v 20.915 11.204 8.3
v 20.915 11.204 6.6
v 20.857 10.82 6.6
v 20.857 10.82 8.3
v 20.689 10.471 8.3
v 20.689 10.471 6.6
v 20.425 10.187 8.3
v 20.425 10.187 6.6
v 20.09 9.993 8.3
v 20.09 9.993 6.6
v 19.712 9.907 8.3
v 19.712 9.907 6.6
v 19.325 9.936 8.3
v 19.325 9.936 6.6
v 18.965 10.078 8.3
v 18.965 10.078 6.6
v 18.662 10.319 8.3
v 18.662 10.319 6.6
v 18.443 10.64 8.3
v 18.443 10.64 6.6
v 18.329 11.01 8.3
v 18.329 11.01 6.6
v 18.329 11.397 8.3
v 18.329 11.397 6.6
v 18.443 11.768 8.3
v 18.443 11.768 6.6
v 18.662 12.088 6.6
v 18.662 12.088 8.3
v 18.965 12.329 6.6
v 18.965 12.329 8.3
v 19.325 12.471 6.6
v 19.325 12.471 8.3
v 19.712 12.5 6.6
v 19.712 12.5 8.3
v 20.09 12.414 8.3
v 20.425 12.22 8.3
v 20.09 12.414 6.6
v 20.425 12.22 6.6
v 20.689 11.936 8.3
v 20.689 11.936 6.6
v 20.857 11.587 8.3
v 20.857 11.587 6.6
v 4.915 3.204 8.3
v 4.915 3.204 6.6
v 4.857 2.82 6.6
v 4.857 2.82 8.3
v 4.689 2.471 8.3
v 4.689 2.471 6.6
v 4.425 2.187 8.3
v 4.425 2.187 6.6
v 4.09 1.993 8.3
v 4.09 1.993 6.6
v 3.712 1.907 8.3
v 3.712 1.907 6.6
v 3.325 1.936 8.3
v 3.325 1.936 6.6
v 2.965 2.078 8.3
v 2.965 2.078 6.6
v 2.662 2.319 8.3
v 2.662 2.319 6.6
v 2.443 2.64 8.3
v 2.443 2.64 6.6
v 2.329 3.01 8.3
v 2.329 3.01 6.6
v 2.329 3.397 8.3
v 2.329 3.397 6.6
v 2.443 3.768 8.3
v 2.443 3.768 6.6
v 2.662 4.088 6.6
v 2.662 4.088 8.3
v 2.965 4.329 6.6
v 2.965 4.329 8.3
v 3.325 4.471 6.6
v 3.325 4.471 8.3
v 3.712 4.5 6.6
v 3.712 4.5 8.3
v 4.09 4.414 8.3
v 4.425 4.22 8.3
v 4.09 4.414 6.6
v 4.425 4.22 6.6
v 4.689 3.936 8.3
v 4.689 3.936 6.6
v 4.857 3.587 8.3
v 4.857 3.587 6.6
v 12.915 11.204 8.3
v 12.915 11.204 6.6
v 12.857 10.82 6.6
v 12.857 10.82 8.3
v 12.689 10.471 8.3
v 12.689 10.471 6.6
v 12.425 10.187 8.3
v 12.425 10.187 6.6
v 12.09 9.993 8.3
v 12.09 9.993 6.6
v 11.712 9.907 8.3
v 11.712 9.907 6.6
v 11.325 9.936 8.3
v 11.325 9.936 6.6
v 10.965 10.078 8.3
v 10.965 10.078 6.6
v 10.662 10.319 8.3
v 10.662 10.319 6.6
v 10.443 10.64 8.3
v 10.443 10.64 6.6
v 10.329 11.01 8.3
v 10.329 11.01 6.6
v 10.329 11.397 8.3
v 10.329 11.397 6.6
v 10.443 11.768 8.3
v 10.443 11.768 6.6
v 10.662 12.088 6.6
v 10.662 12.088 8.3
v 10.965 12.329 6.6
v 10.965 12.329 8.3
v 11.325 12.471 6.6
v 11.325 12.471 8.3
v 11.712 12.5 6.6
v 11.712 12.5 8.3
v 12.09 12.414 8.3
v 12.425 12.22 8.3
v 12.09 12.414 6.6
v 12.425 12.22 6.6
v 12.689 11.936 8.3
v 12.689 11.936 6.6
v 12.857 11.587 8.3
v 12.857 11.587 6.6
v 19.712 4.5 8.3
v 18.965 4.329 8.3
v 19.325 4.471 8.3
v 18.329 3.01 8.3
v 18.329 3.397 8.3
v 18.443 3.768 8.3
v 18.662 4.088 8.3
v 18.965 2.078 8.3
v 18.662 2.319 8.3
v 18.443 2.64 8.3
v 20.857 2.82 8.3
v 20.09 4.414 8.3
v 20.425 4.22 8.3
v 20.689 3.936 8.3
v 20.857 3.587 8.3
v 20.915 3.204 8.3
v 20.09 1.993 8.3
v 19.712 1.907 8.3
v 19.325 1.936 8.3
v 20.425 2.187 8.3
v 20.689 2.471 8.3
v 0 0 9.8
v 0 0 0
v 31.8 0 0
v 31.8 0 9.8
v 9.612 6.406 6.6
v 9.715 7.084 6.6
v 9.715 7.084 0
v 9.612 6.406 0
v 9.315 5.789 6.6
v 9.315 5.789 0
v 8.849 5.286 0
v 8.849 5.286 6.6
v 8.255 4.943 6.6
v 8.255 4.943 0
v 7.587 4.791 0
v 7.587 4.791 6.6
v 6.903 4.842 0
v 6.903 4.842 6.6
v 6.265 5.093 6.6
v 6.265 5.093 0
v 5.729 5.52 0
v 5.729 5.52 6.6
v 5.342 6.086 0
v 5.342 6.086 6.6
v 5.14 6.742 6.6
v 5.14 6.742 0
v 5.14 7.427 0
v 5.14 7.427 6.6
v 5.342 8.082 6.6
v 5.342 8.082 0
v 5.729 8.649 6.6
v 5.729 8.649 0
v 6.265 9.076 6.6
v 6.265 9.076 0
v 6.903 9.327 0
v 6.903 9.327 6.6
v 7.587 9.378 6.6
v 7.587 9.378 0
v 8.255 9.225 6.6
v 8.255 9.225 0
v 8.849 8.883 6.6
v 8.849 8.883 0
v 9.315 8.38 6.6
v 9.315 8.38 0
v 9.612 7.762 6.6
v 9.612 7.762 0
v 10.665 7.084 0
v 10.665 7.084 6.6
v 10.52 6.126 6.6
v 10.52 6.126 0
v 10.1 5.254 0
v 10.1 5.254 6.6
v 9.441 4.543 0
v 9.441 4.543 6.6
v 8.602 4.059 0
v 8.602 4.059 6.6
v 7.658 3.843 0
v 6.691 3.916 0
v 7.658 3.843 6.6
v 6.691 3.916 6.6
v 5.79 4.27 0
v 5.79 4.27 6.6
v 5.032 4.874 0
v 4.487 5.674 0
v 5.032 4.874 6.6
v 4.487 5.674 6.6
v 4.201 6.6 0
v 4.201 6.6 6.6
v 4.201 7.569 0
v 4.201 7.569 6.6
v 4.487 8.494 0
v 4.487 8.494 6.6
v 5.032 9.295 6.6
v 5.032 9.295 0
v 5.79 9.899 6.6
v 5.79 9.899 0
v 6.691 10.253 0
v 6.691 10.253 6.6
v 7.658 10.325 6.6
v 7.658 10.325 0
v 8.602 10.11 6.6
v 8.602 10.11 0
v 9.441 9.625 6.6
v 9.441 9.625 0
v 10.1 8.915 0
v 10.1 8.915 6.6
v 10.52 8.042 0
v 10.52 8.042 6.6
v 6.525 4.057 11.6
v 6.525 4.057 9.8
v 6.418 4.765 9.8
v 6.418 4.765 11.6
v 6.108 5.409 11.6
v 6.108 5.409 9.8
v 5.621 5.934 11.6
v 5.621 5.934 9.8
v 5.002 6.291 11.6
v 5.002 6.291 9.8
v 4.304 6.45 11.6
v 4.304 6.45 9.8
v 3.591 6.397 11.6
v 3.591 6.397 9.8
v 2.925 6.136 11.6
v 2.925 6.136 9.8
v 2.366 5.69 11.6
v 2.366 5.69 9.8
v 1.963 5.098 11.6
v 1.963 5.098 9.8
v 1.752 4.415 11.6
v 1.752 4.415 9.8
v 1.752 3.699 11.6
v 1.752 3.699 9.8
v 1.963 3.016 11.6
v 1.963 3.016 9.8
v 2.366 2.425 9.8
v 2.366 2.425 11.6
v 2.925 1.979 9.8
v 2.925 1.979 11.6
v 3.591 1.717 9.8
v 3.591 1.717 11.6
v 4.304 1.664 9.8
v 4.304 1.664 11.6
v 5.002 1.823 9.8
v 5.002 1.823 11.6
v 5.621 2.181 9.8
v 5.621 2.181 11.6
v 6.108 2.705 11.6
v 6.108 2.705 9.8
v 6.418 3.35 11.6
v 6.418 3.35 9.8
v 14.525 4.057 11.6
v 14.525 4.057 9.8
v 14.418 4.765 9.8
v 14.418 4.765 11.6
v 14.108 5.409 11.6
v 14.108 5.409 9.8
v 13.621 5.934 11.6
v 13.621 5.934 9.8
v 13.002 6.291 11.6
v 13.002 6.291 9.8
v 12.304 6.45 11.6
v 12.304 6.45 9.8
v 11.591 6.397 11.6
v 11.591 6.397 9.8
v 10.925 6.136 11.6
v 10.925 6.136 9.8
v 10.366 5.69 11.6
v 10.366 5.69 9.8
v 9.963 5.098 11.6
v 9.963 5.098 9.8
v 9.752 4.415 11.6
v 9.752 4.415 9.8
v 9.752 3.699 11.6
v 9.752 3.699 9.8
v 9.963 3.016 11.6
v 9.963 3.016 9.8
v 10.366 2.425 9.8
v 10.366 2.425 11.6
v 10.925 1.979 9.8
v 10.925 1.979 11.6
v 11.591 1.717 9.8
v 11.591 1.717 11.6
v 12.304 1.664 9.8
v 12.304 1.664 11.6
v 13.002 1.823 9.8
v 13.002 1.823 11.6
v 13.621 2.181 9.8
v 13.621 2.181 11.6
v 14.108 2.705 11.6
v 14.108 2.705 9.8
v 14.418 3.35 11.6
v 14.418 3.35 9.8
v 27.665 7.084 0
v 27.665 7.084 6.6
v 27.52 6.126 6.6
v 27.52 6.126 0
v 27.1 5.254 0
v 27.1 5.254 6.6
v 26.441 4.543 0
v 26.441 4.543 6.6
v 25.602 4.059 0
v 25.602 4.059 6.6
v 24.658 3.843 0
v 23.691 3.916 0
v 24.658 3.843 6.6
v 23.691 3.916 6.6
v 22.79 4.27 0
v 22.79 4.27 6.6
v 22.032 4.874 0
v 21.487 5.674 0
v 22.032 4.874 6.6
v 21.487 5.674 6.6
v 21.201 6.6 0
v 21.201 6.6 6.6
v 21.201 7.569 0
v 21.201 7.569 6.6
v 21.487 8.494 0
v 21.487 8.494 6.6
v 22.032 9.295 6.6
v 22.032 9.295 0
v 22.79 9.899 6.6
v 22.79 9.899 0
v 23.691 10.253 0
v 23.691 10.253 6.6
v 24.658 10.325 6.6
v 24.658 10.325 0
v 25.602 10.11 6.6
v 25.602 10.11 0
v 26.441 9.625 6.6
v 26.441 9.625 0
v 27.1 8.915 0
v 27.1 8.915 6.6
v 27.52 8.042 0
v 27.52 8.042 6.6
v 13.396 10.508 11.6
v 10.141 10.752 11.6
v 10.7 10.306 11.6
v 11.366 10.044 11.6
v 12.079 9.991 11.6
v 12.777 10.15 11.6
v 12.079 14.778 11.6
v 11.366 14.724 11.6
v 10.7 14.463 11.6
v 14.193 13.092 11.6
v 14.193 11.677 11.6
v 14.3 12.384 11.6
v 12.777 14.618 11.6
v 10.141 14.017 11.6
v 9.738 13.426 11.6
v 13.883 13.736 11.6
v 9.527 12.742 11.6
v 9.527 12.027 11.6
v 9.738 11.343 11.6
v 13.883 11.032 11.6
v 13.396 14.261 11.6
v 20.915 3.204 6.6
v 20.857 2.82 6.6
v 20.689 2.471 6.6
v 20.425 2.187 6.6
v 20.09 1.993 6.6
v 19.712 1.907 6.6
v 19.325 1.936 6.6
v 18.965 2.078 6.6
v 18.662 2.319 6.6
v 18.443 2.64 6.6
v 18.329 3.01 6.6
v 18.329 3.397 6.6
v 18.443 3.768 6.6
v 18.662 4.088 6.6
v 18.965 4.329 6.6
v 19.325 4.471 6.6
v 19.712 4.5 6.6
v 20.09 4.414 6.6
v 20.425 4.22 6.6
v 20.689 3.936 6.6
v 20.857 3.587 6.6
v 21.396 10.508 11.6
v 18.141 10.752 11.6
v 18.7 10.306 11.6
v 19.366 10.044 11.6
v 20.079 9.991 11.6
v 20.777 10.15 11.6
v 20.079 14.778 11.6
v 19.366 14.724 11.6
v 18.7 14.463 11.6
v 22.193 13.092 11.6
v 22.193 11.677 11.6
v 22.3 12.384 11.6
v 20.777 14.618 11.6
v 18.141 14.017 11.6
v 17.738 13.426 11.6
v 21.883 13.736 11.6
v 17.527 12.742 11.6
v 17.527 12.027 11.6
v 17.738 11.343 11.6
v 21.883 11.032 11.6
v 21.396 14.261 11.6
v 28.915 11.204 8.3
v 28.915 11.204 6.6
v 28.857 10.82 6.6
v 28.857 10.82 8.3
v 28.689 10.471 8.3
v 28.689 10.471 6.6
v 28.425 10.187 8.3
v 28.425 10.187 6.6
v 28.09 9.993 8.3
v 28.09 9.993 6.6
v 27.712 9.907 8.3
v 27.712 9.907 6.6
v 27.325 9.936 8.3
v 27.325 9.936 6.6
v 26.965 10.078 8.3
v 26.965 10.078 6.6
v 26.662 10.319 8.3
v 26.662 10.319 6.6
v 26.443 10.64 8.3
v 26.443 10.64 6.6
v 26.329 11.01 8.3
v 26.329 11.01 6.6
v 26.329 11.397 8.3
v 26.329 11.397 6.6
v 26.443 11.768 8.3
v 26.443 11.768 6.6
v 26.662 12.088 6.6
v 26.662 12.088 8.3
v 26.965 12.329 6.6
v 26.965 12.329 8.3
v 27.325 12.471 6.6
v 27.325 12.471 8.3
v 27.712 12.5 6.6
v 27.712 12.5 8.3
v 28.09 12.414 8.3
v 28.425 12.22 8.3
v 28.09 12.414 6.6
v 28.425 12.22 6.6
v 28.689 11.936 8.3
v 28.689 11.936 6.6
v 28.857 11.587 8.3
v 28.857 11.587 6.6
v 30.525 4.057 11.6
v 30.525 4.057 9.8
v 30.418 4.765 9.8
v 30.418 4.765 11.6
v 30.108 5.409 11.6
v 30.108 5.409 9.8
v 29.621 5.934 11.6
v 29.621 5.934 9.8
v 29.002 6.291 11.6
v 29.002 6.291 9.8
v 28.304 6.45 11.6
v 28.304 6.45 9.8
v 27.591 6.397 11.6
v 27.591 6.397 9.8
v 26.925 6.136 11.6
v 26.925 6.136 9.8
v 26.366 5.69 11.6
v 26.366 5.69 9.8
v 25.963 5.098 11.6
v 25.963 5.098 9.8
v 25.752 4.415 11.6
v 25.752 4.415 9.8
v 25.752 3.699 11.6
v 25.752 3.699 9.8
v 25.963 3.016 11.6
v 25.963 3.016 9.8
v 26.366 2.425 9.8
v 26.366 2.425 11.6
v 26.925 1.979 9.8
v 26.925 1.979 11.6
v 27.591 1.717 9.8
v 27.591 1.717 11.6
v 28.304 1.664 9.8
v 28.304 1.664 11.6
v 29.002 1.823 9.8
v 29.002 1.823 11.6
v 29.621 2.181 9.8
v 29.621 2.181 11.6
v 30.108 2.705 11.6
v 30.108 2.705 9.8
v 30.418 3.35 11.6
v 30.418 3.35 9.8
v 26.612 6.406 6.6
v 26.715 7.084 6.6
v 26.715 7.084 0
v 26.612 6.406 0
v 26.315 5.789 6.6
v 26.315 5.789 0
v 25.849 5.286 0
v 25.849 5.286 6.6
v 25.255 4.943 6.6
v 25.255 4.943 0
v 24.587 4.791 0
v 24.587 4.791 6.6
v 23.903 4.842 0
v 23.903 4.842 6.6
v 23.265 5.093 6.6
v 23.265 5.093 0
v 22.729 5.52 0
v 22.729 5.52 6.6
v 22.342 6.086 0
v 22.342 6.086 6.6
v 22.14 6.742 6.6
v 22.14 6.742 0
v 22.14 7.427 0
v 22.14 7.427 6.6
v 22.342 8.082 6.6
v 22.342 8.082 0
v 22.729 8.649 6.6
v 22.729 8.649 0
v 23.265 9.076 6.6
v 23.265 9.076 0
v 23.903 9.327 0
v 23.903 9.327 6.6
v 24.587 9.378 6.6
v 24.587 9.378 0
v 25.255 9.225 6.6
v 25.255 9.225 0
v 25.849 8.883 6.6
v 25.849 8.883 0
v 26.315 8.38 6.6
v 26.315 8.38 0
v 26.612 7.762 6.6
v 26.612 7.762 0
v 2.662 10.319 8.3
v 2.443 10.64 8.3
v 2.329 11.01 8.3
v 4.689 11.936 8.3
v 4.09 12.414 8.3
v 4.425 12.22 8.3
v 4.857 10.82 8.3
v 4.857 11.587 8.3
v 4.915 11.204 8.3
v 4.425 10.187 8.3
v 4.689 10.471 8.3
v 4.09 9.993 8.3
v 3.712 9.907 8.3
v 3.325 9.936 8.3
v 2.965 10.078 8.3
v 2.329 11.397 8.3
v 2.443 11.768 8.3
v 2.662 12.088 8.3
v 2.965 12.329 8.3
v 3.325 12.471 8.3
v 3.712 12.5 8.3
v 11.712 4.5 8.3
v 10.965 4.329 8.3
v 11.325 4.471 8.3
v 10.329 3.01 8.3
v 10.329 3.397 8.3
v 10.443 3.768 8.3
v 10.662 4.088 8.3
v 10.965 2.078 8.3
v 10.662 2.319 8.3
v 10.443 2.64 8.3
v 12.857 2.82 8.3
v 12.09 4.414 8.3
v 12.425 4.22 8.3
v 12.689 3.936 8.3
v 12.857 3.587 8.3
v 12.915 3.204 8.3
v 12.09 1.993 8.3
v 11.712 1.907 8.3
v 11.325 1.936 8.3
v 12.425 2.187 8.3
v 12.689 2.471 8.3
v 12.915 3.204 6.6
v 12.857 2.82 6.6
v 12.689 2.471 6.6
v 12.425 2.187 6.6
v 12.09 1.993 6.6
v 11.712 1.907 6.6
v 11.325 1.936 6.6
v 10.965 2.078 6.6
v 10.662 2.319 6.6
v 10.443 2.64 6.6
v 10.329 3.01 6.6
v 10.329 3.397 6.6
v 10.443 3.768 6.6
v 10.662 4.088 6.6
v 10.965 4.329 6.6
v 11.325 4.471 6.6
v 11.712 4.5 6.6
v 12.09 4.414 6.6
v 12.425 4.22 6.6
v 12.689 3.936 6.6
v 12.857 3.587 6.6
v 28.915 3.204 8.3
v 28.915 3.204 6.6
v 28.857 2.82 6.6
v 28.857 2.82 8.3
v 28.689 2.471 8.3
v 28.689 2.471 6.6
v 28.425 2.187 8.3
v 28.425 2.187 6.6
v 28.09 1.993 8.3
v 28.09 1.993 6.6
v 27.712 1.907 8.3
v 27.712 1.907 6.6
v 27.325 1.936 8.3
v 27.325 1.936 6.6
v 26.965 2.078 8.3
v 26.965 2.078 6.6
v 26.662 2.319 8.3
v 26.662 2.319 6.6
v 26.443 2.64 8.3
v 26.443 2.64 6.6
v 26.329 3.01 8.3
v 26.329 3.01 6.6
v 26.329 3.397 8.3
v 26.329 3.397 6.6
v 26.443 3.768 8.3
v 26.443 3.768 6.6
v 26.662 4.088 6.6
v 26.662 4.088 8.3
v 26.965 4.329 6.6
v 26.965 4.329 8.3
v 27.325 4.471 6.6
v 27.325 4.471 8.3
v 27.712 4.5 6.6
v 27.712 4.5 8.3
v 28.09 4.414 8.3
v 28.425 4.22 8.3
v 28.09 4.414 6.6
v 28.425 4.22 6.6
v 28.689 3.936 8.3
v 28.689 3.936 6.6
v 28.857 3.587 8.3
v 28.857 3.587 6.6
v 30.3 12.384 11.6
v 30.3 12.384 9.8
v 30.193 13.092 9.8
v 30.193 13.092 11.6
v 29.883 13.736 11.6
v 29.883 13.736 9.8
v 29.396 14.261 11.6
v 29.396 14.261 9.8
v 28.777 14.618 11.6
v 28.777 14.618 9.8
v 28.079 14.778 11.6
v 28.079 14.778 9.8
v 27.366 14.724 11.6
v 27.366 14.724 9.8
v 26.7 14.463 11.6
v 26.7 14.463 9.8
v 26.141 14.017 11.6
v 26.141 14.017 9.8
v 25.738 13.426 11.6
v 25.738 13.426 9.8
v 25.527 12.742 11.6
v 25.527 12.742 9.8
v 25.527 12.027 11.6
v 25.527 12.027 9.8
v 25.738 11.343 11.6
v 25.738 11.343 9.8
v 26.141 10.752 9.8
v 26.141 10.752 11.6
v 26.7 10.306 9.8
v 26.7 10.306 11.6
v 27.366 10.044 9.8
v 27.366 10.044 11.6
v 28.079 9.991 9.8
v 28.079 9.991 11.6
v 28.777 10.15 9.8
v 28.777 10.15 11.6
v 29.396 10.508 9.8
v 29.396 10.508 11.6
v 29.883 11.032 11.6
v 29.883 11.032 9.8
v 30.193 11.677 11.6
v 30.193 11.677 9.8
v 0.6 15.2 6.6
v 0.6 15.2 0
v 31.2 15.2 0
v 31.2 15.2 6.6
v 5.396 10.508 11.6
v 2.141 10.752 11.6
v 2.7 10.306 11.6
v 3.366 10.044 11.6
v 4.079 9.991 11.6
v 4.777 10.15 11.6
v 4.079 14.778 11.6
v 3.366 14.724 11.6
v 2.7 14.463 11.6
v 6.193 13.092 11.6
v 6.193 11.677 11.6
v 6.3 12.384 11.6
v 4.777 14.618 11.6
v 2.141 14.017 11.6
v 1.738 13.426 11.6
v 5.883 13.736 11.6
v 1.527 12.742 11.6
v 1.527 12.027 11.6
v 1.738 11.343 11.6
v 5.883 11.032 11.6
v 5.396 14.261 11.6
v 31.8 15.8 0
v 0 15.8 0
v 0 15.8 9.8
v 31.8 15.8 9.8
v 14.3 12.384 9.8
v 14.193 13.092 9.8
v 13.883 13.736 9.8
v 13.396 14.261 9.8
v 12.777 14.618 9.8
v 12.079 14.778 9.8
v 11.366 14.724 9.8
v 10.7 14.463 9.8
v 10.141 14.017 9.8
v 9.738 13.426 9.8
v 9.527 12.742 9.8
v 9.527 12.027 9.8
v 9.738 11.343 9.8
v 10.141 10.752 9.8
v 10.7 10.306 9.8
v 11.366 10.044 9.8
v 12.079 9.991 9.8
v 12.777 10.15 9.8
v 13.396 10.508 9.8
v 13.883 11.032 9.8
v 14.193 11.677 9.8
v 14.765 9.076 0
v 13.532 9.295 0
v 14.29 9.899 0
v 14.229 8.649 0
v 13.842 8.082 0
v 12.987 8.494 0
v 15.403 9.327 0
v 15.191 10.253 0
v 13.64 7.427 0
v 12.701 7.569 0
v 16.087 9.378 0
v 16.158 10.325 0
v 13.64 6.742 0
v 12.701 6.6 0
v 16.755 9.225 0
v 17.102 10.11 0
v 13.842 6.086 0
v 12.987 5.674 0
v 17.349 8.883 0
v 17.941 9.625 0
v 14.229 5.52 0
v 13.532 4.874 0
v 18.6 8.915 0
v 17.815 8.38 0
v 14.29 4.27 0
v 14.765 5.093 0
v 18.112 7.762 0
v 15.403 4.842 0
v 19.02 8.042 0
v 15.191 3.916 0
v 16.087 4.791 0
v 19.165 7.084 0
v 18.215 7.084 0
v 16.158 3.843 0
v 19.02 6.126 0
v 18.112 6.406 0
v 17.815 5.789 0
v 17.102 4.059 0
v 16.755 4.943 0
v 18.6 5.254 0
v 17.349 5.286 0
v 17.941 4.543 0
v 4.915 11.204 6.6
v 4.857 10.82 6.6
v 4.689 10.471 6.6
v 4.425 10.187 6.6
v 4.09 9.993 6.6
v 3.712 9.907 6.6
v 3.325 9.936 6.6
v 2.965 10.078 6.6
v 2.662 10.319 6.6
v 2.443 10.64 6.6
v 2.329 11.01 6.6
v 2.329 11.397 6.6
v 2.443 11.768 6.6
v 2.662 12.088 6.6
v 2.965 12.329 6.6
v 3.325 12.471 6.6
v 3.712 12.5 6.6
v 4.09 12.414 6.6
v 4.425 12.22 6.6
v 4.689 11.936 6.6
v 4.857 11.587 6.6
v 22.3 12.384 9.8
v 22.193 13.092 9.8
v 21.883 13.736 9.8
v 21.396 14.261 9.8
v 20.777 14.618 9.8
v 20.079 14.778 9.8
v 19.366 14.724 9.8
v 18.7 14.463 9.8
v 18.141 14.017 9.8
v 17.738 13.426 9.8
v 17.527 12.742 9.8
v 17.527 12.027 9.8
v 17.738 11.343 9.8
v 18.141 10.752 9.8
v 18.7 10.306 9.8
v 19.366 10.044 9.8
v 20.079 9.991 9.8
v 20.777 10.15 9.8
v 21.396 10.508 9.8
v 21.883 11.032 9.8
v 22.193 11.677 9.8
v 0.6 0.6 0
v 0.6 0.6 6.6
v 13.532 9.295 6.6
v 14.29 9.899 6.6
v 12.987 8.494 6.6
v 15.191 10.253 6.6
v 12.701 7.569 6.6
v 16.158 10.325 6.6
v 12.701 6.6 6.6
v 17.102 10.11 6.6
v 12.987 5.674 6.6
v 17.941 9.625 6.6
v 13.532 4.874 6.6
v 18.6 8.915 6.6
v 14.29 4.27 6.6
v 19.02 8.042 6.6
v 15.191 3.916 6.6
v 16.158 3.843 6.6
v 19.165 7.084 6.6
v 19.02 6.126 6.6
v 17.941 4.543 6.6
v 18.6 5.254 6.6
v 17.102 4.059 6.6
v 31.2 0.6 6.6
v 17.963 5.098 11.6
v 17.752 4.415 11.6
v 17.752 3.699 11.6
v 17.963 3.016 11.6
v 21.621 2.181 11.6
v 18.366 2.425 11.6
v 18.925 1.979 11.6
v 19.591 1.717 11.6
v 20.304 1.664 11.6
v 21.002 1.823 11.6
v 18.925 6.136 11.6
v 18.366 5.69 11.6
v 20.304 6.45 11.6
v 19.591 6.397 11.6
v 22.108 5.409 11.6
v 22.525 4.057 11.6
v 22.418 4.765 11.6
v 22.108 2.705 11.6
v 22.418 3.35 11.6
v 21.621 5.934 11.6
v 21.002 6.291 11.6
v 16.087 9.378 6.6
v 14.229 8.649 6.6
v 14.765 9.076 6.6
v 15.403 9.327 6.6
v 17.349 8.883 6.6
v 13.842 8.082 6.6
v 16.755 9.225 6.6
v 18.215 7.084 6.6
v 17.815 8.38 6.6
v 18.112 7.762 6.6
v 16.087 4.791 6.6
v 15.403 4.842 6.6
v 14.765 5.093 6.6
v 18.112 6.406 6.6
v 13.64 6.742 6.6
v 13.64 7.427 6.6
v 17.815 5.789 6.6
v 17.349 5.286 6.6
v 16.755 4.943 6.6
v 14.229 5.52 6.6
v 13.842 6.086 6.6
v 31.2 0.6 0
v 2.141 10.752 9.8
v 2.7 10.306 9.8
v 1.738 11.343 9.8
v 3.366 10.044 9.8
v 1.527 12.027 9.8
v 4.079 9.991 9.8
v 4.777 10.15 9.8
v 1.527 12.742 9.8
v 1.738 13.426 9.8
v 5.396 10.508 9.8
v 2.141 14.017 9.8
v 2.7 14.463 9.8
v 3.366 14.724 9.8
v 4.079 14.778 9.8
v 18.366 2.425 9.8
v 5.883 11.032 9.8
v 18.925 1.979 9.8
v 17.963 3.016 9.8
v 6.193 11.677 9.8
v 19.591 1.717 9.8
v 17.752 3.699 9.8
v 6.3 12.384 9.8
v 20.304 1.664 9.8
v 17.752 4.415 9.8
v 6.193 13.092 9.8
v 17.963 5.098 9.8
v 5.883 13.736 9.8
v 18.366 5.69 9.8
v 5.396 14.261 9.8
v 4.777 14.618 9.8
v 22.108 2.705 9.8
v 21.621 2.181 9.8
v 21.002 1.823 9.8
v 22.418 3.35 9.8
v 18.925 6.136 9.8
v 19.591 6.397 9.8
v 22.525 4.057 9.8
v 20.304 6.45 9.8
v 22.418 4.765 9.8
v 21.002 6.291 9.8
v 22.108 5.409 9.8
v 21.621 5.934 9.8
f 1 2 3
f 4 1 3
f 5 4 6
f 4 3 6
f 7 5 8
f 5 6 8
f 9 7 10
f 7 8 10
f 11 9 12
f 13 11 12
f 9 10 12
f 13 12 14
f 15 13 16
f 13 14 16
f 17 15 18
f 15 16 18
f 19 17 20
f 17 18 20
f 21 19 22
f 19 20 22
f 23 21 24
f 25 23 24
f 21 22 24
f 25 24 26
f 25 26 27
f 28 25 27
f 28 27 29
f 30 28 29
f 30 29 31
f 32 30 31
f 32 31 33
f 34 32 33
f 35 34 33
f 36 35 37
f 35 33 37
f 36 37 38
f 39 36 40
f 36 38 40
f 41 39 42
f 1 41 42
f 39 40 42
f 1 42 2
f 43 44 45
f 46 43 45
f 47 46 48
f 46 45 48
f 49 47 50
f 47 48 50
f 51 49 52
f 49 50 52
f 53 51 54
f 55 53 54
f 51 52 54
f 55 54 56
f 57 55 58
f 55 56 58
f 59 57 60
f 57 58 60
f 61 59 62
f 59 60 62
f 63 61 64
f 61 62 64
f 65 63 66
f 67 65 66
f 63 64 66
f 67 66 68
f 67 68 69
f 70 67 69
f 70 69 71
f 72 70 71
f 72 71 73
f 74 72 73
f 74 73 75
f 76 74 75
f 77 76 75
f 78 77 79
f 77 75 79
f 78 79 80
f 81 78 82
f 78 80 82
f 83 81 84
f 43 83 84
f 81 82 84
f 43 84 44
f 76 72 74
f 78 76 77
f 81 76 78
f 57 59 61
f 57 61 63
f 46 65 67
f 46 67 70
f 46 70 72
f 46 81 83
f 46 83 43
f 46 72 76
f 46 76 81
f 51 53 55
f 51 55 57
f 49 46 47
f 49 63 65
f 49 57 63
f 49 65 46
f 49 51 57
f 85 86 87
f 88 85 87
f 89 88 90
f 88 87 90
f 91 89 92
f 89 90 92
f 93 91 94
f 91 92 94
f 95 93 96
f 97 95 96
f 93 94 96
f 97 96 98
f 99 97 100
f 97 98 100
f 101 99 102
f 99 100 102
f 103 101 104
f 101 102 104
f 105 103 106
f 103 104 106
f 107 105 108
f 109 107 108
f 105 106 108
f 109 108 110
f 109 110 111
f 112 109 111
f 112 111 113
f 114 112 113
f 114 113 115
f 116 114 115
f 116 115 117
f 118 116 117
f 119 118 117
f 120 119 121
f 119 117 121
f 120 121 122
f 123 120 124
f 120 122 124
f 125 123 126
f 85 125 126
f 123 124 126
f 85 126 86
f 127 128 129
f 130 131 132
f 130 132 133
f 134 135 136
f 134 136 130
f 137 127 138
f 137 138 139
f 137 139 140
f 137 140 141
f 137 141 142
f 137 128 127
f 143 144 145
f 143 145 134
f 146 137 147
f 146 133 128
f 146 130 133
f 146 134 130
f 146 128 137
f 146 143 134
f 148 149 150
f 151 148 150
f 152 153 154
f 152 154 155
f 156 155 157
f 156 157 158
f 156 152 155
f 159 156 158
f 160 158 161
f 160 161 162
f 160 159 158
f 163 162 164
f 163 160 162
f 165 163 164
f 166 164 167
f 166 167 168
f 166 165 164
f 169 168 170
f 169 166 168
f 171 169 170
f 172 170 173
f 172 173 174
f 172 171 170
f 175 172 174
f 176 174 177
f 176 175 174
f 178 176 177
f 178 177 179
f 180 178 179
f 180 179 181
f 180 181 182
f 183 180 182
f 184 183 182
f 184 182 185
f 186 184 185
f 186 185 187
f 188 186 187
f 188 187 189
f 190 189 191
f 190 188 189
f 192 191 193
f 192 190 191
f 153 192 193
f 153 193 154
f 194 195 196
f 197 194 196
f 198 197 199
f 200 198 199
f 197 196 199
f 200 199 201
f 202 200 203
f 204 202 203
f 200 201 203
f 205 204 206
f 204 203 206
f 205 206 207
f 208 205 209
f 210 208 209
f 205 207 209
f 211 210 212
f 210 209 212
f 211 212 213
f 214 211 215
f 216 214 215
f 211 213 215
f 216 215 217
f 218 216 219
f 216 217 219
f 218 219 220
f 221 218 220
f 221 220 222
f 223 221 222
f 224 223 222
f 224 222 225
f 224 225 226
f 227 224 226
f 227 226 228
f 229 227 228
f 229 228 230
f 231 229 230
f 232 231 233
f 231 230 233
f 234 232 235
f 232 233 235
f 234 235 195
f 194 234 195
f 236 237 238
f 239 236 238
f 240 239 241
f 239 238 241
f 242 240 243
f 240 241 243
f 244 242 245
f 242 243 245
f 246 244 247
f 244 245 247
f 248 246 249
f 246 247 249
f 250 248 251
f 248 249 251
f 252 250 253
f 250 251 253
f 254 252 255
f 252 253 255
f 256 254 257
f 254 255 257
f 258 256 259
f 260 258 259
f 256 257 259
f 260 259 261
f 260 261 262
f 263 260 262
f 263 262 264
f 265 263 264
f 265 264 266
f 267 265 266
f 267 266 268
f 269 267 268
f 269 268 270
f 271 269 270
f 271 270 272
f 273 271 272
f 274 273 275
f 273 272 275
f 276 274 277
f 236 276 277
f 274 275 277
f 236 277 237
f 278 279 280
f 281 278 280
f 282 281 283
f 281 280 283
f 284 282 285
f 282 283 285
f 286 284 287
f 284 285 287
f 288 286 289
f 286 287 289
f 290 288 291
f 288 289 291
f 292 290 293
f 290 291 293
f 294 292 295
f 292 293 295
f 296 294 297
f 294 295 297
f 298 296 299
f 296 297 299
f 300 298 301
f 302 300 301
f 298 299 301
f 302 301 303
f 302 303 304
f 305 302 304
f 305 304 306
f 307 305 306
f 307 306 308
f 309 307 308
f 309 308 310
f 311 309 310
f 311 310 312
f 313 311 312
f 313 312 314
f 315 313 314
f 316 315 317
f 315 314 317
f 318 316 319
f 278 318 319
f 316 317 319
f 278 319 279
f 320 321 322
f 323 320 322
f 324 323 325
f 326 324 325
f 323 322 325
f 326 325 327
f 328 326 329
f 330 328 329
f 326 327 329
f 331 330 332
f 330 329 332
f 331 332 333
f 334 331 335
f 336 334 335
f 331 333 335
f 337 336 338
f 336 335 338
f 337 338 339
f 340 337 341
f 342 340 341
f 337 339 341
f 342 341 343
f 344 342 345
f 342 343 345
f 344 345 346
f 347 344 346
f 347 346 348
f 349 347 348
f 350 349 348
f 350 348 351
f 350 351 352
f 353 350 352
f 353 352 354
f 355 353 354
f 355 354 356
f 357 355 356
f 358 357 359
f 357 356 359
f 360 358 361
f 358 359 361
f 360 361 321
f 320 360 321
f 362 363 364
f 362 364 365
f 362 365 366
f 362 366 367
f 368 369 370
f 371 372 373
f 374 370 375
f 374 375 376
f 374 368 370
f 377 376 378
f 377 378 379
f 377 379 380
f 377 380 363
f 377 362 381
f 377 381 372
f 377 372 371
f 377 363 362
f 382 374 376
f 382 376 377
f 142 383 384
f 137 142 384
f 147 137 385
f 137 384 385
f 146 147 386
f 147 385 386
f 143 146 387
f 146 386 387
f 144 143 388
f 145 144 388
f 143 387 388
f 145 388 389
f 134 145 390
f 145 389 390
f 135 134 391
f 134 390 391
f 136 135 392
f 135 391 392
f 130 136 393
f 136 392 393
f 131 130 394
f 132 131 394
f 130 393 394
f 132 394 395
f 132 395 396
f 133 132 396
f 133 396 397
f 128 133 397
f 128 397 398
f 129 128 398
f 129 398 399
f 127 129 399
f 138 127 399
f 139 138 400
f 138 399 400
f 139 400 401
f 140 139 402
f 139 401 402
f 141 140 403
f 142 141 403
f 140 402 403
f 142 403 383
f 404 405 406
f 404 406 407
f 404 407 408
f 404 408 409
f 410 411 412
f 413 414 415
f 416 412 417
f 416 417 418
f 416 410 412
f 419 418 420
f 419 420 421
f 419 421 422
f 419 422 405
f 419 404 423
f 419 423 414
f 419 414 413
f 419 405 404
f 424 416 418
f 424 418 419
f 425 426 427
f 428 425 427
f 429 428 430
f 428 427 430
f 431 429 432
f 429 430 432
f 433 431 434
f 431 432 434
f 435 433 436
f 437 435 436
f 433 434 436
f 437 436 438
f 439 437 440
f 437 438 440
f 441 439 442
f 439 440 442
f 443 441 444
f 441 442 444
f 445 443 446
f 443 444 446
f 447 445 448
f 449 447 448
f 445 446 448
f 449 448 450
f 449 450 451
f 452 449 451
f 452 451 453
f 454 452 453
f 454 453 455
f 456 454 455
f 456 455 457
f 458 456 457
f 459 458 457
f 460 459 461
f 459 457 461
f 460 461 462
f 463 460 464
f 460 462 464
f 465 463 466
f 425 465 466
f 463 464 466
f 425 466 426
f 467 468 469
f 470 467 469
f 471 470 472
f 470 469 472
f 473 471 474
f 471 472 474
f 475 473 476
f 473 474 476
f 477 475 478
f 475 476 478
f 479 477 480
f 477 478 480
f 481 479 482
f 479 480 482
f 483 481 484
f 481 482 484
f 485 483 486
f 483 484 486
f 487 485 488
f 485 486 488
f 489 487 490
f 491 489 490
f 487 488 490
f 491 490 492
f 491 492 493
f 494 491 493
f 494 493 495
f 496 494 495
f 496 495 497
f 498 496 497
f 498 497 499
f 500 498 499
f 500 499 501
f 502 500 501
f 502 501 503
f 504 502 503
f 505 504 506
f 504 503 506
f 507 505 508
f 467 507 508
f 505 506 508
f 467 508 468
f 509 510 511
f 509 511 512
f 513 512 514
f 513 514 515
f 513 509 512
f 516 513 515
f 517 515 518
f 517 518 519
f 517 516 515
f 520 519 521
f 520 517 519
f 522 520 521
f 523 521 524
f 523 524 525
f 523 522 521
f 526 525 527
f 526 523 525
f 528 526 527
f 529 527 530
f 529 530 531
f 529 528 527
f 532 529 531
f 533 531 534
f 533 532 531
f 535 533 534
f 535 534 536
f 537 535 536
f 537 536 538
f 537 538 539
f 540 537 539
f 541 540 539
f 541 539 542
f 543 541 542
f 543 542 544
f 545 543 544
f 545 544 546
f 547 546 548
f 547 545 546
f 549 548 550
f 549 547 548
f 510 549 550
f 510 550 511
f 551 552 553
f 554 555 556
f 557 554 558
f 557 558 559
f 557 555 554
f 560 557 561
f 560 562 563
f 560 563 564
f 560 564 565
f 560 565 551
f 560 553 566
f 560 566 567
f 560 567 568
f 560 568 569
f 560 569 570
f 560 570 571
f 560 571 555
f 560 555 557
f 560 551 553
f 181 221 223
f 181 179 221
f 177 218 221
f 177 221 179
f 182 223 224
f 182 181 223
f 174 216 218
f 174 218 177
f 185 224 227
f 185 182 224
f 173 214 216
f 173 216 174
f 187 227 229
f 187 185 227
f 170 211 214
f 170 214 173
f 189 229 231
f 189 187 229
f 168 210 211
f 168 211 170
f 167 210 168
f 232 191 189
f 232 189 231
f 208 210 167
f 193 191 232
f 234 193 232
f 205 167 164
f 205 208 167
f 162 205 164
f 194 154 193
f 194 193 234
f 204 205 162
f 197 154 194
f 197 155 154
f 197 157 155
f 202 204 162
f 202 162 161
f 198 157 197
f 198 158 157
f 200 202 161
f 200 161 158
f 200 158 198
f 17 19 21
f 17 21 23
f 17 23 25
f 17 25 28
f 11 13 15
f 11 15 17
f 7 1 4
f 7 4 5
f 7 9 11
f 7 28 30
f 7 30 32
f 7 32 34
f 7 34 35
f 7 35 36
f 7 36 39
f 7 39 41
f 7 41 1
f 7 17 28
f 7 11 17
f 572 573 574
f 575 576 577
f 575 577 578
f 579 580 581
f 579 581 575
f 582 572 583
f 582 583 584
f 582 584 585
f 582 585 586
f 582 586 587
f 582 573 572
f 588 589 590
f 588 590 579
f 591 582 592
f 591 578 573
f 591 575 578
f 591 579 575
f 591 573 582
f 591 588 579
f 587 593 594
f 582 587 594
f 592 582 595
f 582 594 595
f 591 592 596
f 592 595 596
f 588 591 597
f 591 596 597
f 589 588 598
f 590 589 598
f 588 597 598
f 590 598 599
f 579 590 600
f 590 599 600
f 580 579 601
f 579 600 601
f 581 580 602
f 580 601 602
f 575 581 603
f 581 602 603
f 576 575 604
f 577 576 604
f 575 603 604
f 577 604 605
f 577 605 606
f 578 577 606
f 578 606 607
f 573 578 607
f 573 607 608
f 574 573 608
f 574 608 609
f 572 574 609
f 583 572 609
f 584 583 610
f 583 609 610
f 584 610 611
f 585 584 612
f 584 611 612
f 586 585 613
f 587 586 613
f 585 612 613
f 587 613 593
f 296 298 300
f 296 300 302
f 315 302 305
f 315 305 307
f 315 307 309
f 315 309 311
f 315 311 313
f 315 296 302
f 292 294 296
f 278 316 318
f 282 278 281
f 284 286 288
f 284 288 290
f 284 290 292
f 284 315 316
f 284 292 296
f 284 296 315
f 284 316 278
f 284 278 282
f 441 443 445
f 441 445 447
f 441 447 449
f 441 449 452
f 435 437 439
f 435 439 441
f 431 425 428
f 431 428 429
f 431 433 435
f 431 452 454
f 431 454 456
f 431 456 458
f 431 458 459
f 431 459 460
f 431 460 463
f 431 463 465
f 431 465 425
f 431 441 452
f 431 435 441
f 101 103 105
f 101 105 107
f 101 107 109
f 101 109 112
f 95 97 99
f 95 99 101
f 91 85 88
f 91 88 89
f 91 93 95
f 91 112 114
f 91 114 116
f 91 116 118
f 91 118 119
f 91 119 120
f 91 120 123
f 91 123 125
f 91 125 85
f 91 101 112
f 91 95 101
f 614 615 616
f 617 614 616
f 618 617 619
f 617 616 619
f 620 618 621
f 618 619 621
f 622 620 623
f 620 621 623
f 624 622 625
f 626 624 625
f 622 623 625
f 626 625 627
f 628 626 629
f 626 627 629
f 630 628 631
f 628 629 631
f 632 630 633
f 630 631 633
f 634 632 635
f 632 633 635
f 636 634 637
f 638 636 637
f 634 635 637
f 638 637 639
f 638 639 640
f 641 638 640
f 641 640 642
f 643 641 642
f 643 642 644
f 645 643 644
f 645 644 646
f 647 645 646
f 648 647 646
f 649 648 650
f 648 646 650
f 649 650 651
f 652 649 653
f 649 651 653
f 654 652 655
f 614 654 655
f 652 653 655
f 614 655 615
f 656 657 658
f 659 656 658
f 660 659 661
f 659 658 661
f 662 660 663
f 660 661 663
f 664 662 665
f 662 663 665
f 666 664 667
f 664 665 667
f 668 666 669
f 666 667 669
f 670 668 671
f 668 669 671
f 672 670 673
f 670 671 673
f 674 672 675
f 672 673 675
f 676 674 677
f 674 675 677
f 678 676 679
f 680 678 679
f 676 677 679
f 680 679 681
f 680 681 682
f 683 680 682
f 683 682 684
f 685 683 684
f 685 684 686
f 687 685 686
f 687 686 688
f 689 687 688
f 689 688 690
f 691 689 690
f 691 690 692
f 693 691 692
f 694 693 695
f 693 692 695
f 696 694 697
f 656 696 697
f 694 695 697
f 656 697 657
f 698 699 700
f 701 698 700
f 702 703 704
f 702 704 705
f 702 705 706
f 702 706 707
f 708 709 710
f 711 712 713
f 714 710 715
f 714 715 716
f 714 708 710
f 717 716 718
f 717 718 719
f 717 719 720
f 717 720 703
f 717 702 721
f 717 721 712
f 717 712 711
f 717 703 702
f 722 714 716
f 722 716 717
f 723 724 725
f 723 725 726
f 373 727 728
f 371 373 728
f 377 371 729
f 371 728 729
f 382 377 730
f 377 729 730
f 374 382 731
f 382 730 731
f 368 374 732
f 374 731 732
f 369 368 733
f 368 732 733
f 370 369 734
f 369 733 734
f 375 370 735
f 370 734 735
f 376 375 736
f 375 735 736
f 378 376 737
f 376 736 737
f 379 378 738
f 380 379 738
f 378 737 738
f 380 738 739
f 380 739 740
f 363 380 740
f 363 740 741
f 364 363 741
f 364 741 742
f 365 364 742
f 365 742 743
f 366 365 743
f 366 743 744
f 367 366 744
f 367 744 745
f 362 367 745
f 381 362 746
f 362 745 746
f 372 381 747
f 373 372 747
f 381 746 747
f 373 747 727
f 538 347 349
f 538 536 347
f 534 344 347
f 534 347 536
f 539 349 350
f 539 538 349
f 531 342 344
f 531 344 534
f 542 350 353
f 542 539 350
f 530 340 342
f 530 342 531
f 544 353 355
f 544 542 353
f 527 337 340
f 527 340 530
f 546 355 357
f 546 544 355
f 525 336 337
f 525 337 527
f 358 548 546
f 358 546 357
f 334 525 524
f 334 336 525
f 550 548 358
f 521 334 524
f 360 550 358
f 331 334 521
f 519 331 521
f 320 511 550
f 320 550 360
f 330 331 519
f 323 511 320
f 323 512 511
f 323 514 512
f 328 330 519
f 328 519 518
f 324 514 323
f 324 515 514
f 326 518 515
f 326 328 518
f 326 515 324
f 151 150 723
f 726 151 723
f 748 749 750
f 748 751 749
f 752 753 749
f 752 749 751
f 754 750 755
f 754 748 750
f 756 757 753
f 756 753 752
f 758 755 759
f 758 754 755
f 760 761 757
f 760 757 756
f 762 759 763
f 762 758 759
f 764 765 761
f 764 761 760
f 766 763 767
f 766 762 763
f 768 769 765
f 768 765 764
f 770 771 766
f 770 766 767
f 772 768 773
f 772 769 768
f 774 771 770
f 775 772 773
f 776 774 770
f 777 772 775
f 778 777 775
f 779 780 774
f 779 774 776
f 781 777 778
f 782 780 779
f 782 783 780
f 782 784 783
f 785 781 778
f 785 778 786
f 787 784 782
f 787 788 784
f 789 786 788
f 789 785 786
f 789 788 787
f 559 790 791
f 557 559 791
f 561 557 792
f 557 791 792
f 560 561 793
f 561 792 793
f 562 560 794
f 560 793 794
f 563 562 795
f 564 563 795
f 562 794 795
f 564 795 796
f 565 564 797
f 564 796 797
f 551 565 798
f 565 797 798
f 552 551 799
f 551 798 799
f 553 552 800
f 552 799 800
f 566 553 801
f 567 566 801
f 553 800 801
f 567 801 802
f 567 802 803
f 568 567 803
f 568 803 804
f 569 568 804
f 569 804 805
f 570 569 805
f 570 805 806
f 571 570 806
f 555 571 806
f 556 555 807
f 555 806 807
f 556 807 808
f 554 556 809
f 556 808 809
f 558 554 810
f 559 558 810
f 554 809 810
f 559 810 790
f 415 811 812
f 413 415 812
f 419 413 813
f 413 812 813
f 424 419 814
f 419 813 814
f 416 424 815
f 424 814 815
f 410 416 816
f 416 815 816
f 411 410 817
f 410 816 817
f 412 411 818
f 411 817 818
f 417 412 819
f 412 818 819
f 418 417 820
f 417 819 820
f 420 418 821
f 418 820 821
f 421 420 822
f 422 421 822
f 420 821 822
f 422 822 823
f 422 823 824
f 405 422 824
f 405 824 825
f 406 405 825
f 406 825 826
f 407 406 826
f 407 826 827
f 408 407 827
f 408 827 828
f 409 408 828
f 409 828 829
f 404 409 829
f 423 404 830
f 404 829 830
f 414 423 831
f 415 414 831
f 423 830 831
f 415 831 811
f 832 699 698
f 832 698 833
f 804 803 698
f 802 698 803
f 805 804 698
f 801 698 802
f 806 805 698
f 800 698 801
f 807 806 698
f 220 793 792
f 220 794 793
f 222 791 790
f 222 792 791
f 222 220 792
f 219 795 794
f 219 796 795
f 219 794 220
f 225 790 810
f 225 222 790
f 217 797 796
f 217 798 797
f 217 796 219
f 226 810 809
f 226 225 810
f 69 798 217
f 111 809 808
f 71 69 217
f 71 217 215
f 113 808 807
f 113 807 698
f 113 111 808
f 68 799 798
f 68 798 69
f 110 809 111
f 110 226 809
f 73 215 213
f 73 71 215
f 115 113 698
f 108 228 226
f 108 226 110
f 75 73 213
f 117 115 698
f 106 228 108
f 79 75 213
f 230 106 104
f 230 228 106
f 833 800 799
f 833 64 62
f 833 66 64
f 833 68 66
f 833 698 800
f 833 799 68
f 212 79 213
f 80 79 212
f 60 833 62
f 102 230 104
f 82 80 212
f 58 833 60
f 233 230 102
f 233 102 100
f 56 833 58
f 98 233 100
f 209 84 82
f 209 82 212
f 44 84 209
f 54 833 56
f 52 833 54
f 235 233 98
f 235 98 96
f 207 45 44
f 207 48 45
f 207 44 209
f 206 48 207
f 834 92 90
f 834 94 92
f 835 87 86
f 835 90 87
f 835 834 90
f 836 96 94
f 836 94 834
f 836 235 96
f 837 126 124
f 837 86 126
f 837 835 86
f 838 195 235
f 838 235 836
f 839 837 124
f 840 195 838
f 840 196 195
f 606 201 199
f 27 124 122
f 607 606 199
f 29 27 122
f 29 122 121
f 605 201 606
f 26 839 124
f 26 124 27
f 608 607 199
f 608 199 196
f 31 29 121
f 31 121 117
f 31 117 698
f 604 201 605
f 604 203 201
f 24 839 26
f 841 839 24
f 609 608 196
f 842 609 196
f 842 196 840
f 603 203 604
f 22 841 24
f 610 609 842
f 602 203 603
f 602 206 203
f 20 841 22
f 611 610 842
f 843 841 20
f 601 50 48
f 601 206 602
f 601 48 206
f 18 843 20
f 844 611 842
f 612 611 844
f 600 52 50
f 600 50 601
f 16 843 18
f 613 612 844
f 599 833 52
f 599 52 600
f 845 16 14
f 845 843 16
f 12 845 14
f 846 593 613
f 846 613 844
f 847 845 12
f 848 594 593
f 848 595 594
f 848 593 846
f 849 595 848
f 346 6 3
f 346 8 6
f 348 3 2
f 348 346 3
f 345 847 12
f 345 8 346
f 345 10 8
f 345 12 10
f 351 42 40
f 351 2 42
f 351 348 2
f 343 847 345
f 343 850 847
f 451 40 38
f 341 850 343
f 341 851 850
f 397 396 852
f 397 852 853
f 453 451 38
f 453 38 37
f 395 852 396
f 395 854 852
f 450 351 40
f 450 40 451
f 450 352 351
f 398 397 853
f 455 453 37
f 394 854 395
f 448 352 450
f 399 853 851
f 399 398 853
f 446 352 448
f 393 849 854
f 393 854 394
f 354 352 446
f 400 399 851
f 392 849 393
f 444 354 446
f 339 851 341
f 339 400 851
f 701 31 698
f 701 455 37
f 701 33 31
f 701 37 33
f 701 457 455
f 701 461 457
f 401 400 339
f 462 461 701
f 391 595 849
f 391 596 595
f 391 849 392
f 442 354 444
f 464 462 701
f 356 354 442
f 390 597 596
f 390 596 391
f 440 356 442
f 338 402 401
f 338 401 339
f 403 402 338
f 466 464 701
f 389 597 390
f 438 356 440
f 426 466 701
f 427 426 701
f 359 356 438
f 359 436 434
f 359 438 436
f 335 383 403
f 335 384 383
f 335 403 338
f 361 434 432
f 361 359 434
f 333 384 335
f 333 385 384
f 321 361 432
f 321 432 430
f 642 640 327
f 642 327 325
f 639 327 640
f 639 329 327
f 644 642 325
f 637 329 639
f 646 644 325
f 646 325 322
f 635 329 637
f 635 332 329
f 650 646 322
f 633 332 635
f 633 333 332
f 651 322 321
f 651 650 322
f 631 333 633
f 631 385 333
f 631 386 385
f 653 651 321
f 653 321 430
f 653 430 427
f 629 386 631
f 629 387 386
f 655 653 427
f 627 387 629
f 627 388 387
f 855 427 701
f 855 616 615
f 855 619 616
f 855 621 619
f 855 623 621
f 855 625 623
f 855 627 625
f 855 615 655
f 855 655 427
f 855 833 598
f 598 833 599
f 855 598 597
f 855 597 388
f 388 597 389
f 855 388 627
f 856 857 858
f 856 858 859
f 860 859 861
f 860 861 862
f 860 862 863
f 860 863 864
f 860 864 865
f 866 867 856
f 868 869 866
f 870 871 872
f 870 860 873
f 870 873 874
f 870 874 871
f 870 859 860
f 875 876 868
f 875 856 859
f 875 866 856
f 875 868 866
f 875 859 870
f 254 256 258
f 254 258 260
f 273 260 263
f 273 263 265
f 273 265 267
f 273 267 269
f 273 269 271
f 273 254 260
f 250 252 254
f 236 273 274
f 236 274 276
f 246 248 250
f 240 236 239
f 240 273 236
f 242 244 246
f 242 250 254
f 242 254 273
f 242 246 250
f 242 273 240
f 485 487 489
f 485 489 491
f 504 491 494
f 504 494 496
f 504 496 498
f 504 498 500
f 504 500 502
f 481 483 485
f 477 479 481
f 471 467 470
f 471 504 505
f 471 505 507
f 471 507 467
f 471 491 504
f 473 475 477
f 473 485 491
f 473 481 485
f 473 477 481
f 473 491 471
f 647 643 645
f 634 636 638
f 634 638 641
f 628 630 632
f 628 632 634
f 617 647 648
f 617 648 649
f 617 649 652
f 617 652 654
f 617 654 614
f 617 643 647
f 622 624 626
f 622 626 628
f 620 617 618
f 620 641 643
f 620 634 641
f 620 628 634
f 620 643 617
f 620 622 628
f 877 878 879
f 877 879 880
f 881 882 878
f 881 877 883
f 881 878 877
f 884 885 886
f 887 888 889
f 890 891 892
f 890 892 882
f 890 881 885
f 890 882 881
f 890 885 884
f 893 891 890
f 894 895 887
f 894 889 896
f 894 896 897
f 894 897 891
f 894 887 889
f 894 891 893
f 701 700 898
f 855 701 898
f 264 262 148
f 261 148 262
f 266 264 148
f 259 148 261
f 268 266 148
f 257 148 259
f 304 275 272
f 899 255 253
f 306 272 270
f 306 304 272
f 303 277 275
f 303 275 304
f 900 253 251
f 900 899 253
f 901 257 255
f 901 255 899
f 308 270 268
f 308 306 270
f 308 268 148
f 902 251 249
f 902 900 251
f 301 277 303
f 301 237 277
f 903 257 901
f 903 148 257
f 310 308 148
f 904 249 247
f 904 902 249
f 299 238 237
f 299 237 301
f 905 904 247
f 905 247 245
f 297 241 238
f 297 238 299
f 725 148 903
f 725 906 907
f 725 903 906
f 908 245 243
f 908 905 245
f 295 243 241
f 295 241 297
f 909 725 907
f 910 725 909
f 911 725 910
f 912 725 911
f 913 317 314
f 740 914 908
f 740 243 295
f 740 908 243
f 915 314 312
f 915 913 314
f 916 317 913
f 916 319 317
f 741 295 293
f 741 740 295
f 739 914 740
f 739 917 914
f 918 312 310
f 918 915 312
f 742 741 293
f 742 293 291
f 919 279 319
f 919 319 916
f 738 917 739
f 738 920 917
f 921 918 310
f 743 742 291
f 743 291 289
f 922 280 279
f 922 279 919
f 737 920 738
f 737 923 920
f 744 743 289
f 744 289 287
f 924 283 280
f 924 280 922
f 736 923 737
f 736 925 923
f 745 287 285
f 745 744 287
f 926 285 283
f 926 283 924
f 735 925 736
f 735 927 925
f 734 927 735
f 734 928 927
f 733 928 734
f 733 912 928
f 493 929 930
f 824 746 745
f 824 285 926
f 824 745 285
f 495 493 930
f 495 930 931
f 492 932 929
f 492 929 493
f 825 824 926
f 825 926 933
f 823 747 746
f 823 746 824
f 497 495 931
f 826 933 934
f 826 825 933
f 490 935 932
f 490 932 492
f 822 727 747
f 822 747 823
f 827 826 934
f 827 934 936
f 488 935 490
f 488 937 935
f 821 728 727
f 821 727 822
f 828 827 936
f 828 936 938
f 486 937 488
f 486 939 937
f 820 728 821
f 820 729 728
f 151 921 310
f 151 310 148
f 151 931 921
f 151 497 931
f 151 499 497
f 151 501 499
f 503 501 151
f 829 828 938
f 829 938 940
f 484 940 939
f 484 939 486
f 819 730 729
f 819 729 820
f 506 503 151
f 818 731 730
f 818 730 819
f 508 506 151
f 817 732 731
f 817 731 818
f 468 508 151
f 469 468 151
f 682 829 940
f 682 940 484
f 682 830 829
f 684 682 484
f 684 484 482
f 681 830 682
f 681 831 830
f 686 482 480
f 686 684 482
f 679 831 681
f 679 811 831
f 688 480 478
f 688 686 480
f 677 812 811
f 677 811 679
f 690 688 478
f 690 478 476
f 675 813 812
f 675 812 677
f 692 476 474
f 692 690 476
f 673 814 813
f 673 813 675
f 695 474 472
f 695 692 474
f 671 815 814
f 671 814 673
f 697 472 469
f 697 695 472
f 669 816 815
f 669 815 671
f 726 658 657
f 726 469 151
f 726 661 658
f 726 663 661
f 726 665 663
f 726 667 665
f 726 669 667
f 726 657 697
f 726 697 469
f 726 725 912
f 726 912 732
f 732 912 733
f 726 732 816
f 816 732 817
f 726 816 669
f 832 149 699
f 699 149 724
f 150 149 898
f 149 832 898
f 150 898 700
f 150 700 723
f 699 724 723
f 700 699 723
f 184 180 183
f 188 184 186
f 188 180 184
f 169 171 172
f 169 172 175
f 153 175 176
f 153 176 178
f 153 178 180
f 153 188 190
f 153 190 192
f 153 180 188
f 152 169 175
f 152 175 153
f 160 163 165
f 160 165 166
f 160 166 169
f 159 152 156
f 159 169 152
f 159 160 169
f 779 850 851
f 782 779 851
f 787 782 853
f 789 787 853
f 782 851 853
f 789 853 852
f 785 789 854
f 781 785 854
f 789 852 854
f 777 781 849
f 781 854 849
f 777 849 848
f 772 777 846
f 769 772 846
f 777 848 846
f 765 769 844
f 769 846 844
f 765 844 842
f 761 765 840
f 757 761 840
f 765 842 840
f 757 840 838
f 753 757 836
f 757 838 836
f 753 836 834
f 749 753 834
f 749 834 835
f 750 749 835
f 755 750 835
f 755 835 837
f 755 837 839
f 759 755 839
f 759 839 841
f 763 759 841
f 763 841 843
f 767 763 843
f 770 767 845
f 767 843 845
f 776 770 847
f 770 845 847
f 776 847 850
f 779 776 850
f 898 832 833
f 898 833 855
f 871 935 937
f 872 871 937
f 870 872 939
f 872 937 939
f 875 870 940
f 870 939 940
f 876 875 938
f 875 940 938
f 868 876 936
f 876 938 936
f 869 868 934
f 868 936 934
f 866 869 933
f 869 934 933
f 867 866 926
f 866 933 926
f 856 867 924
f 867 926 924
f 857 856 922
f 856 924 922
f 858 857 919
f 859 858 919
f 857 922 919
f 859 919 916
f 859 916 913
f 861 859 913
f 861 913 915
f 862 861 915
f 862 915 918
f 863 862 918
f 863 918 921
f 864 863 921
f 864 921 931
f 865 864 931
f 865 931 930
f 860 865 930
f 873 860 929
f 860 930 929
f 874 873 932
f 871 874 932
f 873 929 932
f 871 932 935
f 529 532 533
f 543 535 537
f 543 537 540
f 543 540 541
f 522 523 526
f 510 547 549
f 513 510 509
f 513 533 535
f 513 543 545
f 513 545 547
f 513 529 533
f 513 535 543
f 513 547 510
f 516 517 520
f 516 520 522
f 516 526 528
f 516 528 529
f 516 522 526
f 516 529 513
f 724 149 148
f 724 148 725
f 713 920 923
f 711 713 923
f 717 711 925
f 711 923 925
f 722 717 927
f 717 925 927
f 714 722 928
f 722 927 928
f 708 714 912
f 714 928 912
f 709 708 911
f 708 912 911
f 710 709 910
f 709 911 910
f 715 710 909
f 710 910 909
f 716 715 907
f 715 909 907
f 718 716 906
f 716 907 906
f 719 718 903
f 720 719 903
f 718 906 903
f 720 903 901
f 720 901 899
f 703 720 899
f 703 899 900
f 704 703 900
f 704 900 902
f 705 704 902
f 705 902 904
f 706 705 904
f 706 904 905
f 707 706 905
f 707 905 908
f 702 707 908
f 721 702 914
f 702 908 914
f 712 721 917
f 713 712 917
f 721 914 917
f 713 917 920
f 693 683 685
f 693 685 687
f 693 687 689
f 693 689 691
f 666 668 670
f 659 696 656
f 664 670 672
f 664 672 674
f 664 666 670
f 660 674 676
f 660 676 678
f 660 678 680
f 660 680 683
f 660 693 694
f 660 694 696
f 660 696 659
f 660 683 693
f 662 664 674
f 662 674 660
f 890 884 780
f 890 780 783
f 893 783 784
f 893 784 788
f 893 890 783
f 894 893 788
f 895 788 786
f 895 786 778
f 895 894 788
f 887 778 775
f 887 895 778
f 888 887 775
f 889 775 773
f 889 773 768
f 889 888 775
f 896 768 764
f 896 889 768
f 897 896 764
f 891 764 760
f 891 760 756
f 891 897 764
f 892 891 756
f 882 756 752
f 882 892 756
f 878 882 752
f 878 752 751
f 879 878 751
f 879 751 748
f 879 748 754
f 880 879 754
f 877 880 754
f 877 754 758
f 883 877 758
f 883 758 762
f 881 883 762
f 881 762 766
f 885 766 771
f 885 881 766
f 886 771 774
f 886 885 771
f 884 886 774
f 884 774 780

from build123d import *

# Parameters (mm, degrees)
F0_W     = 31.8
F0_H     = 15.8
F1_DEPTH = 9.8
F2_R     = 2.4
F3_DEPTH = 1.8
F4_W     = 30.6
F4_H     = 14.6
F5_DEPTH = 6.6
F6_R     = 1.3
F7_DEPTH = 1.7
F8_R     = 3.25
F8_R_2   = 2.3
F9_DEPTH = 6.6


with BuildPart() as f1:
    # F0 (on Top) → F1 (new body)
    with BuildSketch(Plane.XY):
        with Locations((15.9, 7.9)):
            Rectangle(F0_W, F0_H)
    extrude(amount=F1_DEPTH)

    # F2 (on face) → F3 (join)
    with BuildSketch(Plane.XY.offset(9.8)):
        with Locations((3.9, 12.384264)):
            Circle(F2_R)
        with Locations((28.124928, 4.057131)):
            Circle(F2_R)
        with Locations((27.9, 12.384264)):
            Circle(F2_R)
        with Locations((19.9, 12.384264)):
            Circle(F2_R)
        with Locations((20.124928, 4.057131)):
            Circle(F2_R)
        with Locations((11.9, 12.384264)):
            Circle(F2_R)
        with Locations((12.124928, 4.057131)):
            Circle(F2_R)
        with Locations((4.124928, 4.057131)):
            Circle(F2_R)
    extrude(amount=F3_DEPTH)

    # F4 (on face) → F5 (cut)
    with BuildSketch(Plane(origin=(0, 0, 0), x_dir=(1, 0, 0), z_dir=(0, 0, -1))):
        with Locations((15.9, -7.9)):
            Rectangle(F4_W, F4_H)
    extrude(amount=-F5_DEPTH, mode=Mode.SUBTRACT)

    # F6 (on face) → F7 (cut)
    with BuildSketch(Plane(origin=(0, 0, 6.6), x_dir=(1, 0, 0), z_dir=(0, 0, -1))):
        with Locations((3.614632, -3.203599)):
            Circle(F6_R)
        with Locations((11.614632, -3.203599)):
            Circle(F6_R)
        with Locations((19.614632, -3.203599)):
            Circle(F6_R)
        with Locations((27.614632, -3.203599)):
            Circle(F6_R)
        with Locations((27.614632, -11.203599)):
            Circle(F6_R)
        with Locations((19.614632, -11.203599)):
            Circle(F6_R)
        with Locations((11.614632, -11.203599)):
            Circle(F6_R)
        with Locations((3.614632, -11.203599)):
            Circle(F6_R)
    extrude(amount=-F7_DEPTH, mode=Mode.SUBTRACT)

    # F8 (on face) → F9 (join)
    with BuildSketch(Plane(origin=(0, 0, 6.6), x_dir=(1, 0, 0), z_dir=(0, 0, -1))):
        with Locations((7.414678, -7.084377)):
            Circle(F8_R)
        with Locations((7.414678, -7.084377)):
            Circle(F8_R_2, mode=Mode.SUBTRACT)
        with Locations((15.914678, -7.084377)):
            Circle(F8_R)
        with Locations((15.914678, -7.084377)):
            Circle(F8_R_2, mode=Mode.SUBTRACT)
        with Locations((24.414678, -7.084377)):
            Circle(F8_R)
        with Locations((24.414678, -7.084377)):
            Circle(F8_R_2, mode=Mode.SUBTRACT)
    extrude(amount=F9_DEPTH)


solid = f1.part
